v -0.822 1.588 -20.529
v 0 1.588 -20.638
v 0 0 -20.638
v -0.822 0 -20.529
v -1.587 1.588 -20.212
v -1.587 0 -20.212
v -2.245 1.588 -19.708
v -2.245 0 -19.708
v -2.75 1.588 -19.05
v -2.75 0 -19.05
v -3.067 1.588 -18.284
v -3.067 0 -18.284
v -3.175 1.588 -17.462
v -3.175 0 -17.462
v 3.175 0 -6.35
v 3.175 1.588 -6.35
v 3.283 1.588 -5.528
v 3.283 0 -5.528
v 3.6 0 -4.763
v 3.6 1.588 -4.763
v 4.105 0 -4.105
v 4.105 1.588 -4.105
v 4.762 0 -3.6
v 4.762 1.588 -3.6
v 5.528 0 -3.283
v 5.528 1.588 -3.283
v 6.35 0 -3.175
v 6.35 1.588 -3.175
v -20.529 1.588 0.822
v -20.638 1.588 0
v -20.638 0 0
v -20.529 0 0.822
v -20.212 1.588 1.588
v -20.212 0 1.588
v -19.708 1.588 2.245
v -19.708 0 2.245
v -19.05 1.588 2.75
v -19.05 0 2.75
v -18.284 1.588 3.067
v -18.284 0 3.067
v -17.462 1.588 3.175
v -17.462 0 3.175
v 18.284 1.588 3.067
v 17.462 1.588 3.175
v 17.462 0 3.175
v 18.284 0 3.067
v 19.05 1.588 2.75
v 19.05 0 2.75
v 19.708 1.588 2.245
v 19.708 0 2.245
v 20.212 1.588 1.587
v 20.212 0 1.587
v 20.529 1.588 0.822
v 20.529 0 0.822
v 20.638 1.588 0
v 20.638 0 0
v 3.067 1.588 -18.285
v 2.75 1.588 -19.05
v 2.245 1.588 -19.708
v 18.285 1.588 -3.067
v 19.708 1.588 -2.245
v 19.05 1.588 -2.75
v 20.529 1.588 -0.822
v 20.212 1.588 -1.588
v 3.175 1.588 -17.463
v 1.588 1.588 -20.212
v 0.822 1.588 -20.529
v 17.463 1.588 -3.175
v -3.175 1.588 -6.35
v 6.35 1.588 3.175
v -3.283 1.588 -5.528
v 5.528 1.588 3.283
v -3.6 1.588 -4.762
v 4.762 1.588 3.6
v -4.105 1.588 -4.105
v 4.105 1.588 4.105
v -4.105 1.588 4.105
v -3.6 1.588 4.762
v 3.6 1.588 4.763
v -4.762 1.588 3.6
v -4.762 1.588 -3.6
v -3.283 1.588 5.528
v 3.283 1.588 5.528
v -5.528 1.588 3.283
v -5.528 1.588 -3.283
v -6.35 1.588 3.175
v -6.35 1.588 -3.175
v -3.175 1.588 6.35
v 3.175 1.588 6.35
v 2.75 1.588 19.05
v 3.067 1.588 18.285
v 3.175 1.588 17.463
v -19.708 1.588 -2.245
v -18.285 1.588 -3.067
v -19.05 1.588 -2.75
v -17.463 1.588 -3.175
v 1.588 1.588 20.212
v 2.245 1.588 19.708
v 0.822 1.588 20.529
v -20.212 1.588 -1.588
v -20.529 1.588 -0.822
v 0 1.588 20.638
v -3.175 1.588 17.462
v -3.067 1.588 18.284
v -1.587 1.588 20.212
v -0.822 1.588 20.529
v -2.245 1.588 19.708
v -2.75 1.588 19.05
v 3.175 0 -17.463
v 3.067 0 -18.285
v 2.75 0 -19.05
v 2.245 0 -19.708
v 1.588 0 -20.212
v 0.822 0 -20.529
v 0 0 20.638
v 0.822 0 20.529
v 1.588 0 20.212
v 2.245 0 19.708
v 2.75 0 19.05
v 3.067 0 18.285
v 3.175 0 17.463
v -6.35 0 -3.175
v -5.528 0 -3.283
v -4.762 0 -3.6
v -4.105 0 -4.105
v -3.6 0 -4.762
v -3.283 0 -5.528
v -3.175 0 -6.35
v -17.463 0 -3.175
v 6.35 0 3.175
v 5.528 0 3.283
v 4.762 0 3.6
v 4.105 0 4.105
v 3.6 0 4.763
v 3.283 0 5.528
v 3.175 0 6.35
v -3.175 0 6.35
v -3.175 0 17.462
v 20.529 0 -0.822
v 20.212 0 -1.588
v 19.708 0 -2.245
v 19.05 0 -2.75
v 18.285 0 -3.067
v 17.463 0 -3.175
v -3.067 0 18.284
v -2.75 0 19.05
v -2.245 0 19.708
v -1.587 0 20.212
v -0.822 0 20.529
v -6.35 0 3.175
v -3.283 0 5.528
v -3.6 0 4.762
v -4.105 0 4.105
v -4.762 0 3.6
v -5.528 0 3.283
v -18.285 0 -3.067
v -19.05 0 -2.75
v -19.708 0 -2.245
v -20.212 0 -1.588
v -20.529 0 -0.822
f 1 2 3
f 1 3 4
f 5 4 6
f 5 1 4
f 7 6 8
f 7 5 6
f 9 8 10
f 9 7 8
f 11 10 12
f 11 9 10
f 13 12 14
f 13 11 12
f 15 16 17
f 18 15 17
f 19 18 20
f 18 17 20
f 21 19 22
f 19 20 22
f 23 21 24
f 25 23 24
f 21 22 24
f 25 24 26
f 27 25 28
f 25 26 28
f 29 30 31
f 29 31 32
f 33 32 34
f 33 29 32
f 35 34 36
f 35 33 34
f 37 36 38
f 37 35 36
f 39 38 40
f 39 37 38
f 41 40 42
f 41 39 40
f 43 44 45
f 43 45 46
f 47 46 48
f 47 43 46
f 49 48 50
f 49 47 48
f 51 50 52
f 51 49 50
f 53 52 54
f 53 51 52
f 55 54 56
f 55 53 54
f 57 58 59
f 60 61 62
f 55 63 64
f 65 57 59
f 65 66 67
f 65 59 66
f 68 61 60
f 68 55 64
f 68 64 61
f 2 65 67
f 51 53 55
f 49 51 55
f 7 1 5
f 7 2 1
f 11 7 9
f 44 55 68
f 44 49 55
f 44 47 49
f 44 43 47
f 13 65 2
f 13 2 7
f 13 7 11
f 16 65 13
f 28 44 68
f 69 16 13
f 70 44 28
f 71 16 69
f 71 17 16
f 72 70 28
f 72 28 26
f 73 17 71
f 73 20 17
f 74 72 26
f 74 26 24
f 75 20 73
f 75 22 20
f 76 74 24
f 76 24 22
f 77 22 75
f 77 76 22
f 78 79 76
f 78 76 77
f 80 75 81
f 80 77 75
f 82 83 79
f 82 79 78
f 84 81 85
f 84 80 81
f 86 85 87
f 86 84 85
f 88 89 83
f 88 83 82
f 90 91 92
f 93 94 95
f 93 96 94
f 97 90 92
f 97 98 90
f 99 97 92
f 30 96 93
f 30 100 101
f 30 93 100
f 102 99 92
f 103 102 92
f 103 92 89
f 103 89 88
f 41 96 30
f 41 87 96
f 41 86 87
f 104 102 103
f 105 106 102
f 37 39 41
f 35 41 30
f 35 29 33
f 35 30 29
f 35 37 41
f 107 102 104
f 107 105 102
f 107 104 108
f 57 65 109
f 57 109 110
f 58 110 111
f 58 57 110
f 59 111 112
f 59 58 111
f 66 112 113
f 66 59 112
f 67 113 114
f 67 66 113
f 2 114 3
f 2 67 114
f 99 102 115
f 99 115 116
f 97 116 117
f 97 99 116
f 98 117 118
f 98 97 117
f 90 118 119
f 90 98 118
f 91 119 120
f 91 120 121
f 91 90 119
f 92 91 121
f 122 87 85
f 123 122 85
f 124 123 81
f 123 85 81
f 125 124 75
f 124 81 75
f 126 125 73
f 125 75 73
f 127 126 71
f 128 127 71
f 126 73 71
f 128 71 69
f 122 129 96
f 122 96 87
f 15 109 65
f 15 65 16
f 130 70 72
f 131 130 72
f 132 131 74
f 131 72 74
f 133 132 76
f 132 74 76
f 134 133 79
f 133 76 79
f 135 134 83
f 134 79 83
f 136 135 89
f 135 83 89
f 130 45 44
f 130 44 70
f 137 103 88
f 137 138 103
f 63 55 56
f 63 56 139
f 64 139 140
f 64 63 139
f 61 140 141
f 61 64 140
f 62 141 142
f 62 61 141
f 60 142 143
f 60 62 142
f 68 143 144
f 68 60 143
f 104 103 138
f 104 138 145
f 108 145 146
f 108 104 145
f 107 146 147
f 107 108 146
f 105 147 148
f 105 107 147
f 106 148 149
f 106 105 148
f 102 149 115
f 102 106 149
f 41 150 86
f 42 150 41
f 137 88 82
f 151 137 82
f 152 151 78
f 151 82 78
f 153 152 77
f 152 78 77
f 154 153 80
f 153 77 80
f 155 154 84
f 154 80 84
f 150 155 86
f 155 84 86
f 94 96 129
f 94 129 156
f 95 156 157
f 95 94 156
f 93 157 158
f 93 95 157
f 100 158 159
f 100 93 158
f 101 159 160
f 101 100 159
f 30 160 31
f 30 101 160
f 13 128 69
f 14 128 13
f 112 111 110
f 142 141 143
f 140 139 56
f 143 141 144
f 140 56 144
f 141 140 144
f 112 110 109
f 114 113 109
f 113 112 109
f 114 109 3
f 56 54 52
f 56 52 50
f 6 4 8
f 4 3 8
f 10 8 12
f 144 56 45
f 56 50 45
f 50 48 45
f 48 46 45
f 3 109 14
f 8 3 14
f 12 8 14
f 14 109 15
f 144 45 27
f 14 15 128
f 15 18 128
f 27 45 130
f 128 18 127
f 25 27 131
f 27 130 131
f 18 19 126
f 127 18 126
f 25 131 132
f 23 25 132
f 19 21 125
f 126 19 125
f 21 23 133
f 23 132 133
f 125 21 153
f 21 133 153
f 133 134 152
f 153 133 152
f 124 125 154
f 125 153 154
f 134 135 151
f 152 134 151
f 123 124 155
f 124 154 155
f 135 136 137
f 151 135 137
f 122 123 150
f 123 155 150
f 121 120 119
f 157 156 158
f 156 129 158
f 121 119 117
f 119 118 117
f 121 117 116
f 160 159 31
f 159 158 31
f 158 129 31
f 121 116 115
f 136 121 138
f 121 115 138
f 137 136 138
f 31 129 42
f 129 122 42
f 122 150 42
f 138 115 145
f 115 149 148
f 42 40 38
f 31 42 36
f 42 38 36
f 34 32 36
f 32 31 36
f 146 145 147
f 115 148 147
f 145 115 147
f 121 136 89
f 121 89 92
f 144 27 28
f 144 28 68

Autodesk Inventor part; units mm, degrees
ref_plane "YZ Plane" through (0, 0, 0) normal (1, 0, 0) x (0, 1, 0)
ref_plane "XZ Plane" through (0, 0, 0) normal (0, 1, 0) x (-1, 0, 0)
ref_plane "XY Plane" through (0, 0, 0) normal (0, 0, 1) x (1, 0, 0)
sketch "Sketch3" plane through (0, 0, 0) normal (0, 1, 0) x (-1, 0, 0)
  line L0 (-3.175, 3.175) -> (-3.175, 20.6375)
  line L1 (-3.175, 20.6375) -> (3.175, 20.6375)
  line L2 (3.175, 20.6375) -> (3.175, 3.175)
  line L3 (3.175, 3.175) -> (20.6375, 3.175)
  line L4 (20.6375, 3.175) -> (20.6375, -3.175)
  line L5 (20.6375, -3.175) -> (3.175, -3.175)
  line L6 (3.175, -3.175) -> (3.175, -20.6375)
  line L7 (3.175, -20.6375) -> (-3.175, -20.6375)
  line L8 (-3.175, -20.6375) -> (-3.175, -3.175)
  line L9 (-3.175, -3.175) -> (-20.6375, -3.175)
  line L10 (-20.6375, -3.175) -> (-20.6375, 3.175)
  line L11 (-20.6375, 3.175) -> (-3.175, 3.175)
  line L12 (0, 0) -> (2.5051, 0)
  line L13 (0, 0) -> (0, 2.7764)
  line L14 (0, 0) -> (2.5118, 2.5118)
  dimension "d17" = 45
  dimension "d18" = 6.35
  dimension "d19" = 20.6375
  dimension "d20" = 20.6375
extrude "Extrusion1" add sketch "Sketch3" along normal blind 1.5875
fillet "Fillet1" radius 3.175 1 edges at (-3.175, 0.7937, 20.6375)
fillet "Fillet2" radius 3.175 1 edges at (3.175, 0.7937, 20.6375)
fillet "Fillet3" radius 3.175 1 edges at (-20.6375, 0.7937, 3.175)
fillet "Fillet4" radius 3.175 1 edges at (-20.6375, 0.7937, -3.175)
fillet "Fillet5" radius 3.175 1 edges at (-3.175, 0.7937, -20.6375)
fillet "Fillet6" radius 3.175 1 edges at (3.175, 0.7937, -20.6375)
fillet "Fillet7" radius 3.175 1 edges at (20.6375, 0.7937, 3.175)
fillet "Fillet8" radius 3.175 1 edges at (20.6375, 0.7937, -3.175)
fillet "Fillet9" radius 3.175 1 edges at (3.175, 0.7937, 3.175)
fillet "Fillet10" radius 3.175 1 edges at (-3.175, 0.7937, 3.175)
fillet "Fillet11" radius 3.175 1 edges at (-3.175, 0.7937, -3.175)
fillet "Fillet12" radius 3.175 1 edges at (3.175, 0.7937, -3.175)
equation "\"d19\" = d20"
properties part number "MotorBottom"
